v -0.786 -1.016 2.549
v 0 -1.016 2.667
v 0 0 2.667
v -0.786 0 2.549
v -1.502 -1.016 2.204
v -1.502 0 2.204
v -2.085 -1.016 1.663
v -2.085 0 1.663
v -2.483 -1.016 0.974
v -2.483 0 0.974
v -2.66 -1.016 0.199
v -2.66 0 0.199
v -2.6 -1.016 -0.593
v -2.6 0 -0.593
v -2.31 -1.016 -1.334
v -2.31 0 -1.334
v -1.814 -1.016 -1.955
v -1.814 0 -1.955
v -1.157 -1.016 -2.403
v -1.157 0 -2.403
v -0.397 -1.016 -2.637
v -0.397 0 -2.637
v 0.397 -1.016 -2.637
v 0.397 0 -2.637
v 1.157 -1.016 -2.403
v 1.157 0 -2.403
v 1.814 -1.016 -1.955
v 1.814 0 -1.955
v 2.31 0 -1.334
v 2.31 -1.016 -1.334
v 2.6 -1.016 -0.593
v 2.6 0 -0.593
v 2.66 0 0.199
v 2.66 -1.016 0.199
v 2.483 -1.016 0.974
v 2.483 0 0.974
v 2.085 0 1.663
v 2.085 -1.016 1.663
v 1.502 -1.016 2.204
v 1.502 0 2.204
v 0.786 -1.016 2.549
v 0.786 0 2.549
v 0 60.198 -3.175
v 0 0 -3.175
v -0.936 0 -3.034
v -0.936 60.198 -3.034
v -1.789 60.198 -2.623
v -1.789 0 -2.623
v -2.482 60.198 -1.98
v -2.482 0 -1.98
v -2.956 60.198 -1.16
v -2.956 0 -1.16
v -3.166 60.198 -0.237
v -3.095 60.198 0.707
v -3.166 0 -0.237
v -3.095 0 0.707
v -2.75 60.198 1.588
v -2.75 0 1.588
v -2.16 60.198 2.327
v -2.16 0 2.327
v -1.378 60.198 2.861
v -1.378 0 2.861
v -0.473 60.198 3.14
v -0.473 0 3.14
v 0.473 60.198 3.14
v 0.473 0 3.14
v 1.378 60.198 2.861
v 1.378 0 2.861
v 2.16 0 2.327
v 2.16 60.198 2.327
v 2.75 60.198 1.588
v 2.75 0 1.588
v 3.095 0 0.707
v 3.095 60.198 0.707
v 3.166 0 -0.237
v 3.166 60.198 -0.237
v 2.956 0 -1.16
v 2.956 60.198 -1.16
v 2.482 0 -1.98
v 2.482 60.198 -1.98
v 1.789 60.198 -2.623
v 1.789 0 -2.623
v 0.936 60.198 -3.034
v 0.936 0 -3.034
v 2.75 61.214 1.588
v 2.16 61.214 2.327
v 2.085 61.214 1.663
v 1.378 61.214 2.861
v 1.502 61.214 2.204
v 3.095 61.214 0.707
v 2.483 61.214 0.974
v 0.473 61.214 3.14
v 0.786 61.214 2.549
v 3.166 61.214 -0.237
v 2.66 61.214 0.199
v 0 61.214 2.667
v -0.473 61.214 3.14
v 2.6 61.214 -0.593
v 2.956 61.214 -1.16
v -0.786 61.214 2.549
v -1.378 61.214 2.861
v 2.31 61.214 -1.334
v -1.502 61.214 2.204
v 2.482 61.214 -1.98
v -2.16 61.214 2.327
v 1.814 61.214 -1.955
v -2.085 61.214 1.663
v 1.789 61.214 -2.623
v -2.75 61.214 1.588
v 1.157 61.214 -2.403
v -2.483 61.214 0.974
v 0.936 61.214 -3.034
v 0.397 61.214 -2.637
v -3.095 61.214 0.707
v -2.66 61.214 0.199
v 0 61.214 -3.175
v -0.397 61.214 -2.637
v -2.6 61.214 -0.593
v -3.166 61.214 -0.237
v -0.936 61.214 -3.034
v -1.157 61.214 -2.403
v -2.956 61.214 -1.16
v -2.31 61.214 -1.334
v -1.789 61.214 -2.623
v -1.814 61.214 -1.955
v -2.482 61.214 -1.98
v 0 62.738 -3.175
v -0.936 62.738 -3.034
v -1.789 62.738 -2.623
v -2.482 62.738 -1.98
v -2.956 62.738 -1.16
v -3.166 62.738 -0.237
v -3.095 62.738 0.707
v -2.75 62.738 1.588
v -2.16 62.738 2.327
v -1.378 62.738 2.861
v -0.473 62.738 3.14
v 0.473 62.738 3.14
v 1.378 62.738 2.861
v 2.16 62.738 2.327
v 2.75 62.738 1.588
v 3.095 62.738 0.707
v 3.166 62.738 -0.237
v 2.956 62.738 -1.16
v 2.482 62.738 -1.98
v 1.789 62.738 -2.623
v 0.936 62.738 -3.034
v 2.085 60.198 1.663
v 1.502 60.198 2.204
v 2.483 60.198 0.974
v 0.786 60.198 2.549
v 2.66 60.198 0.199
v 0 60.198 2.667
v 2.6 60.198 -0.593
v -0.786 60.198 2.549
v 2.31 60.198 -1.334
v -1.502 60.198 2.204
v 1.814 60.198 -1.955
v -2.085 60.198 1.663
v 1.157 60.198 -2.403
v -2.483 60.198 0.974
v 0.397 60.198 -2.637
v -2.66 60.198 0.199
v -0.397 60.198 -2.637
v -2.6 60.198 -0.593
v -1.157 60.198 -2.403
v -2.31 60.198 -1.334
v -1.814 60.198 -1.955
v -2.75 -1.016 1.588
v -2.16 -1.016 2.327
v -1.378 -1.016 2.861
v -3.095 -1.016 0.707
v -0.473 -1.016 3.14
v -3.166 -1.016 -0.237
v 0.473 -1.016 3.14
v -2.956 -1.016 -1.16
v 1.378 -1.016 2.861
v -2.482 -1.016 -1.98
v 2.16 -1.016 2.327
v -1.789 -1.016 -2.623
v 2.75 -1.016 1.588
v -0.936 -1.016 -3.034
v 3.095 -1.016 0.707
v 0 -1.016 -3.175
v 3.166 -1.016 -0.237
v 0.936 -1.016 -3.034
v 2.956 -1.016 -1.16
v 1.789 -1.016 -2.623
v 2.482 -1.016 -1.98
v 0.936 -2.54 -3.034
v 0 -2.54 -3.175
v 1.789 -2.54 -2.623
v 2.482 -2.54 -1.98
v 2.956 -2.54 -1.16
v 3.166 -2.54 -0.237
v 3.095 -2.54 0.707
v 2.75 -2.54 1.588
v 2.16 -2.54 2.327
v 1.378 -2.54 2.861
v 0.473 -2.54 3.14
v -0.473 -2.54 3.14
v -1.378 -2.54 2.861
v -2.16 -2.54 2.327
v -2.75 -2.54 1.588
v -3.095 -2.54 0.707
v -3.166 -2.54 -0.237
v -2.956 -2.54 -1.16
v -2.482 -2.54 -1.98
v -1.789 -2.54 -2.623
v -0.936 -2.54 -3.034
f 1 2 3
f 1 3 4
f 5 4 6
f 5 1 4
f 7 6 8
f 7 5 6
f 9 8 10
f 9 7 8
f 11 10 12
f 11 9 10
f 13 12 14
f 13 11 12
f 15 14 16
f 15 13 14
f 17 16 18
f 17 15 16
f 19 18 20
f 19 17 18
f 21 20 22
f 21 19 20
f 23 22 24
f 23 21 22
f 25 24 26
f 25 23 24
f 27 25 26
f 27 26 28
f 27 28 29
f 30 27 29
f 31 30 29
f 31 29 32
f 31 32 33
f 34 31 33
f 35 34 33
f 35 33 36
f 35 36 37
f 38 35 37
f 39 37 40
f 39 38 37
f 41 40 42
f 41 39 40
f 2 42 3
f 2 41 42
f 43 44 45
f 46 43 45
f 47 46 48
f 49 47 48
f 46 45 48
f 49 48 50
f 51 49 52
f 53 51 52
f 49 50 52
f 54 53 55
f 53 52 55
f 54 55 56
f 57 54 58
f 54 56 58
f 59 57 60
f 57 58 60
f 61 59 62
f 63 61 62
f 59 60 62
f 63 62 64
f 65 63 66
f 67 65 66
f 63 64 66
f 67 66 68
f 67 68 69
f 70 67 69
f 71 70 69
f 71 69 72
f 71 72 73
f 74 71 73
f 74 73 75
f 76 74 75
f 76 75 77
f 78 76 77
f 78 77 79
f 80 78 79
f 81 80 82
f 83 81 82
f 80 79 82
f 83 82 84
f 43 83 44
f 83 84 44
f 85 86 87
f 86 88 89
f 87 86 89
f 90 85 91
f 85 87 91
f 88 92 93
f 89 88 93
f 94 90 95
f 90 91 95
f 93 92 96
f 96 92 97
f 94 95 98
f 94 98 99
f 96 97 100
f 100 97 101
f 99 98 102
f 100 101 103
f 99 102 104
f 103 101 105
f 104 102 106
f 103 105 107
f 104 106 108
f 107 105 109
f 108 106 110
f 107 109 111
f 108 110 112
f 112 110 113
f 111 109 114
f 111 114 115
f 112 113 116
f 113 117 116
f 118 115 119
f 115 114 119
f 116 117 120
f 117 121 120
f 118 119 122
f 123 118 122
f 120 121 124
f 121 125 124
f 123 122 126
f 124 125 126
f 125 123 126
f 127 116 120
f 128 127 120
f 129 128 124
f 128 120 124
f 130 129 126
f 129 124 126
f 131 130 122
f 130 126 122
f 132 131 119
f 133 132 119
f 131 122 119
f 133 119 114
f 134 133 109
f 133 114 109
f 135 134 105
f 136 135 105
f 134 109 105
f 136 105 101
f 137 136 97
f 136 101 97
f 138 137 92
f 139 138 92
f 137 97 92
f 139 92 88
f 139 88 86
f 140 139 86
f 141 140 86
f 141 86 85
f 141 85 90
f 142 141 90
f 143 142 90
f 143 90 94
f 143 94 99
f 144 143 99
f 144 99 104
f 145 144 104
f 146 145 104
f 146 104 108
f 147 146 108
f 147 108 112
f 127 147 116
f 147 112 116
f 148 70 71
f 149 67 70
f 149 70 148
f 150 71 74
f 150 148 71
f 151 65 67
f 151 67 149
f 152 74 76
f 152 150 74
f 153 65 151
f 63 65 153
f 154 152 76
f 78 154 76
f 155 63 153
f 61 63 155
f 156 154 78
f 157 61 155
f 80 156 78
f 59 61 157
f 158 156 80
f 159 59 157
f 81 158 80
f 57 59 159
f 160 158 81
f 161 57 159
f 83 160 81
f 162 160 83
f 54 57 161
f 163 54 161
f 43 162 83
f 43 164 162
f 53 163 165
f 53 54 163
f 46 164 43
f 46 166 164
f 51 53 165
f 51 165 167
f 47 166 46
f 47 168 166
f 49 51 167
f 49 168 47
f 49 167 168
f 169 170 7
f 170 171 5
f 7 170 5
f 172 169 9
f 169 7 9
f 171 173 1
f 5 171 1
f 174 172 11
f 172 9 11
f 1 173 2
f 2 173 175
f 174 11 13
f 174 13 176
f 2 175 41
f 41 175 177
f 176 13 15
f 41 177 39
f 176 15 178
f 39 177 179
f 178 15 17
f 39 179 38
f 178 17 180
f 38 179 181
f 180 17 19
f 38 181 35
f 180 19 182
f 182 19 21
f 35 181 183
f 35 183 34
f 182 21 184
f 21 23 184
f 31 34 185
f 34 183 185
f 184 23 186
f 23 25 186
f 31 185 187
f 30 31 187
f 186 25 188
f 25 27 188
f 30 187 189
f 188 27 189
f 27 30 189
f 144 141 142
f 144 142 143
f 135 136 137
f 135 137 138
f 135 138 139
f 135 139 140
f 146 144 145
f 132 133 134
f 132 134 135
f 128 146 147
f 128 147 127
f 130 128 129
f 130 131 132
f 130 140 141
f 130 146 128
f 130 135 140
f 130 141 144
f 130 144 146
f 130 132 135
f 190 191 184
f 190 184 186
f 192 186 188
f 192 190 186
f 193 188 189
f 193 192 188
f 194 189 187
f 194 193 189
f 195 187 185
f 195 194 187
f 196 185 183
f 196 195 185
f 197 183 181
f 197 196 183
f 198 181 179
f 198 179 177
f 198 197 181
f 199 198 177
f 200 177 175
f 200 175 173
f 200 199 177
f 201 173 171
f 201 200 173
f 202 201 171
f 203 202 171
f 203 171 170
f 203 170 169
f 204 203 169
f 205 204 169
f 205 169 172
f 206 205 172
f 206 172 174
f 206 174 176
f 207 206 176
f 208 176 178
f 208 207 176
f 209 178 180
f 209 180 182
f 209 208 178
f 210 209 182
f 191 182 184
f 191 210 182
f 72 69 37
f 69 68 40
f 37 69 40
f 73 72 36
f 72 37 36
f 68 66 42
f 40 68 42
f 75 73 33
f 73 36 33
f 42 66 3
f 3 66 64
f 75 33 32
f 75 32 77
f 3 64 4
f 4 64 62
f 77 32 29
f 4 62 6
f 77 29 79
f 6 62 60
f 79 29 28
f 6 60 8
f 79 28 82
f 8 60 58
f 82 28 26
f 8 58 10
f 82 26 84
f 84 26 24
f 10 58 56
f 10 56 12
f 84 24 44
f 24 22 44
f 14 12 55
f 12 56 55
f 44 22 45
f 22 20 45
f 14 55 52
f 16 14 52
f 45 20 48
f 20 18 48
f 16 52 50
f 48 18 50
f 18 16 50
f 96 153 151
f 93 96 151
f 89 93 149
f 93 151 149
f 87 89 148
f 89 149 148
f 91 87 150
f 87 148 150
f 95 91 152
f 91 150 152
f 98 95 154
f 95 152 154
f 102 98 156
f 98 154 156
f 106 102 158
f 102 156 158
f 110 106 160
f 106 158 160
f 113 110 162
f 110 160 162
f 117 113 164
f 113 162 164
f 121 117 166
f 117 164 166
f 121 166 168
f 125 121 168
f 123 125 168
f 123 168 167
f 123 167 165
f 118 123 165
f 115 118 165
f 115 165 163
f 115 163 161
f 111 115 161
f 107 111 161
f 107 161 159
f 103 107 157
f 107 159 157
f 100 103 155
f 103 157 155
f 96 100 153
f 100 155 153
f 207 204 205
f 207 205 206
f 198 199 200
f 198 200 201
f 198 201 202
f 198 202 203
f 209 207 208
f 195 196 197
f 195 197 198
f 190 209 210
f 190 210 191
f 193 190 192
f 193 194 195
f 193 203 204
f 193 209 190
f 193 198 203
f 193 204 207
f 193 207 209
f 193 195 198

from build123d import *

# Parameters (mm, degrees)
SKETCH1_R           = 3.175
BOSS_EXTRUDE1_DEPTH = 60.198
SKETCH2_R           = 2.667
BOSS_EXTRUDE2_DEPTH = 1.016
SKETCH3_R           = 3.175
BOSS_EXTRUDE3_DEPTH = 1.524
BOSS_EXTRUDE4_START = 1.016
SKETCH4_R           = 2.667
BOSS_EXTRUDE4_DEPTH = 1.016
BOSS_EXTRUDE5_START = 1.524
SKETCH7_R           = 3.175
BOSS_EXTRUDE5_DEPTH = 1.524


with BuildPart() as part:
    # Sketch1 → Boss-Extrude1 (new body)
    with BuildSketch(Plane(origin=(0, 0, 0), x_dir=(1, 0, 0), z_dir=(0, 1, 0))):
        with Locations(Location((0, 0, 0), (0, 0, 90))):
            Circle(SKETCH1_R)
    extrude(amount=BOSS_EXTRUDE1_DEPTH)

    # Sketch2 → Boss-Extrude2 (add)
    with BuildSketch(Plane(origin=(0, 60.198, 0), x_dir=(1, 0, 0), z_dir=(0, 1, 0))):
        with Locations(Location((0, 0, 0), (0, 0, 270))):
            Circle(SKETCH2_R)
    extrude(amount=BOSS_EXTRUDE2_DEPTH)

    # Sketch3 → Boss-Extrude3 (add)
    with BuildSketch(Plane(origin=(0, 61.214, 0), x_dir=(1, 0, 0), z_dir=(0, 1, 0))):
        with Locations(Location((0, 0, 0), (0, 0, 90))):
            Circle(SKETCH3_R)
    extrude(amount=BOSS_EXTRUDE3_DEPTH)

    # Sketch4 → Boss-Extrude4 (add)
    with BuildSketch(Plane.XZ.offset(BOSS_EXTRUDE4_START)):
        with Locations(Location((0, 0, 0), (0, 0, 90))):
            Circle(SKETCH4_R)
    extrude(amount=-BOSS_EXTRUDE4_DEPTH)

    # Sketch7 → Boss-Extrude5 (add)
    with BuildSketch(Plane(origin=(0, -1.016, 0), x_dir=(-1, 0, 0), z_dir=(0, -1, 0)).offset(BOSS_EXTRUDE5_START)):
        with Locations(Location((0, 0, 0), (0, 0, 90))):
            Circle(SKETCH7_R)
    extrude(amount=-BOSS_EXTRUDE5_DEPTH)


solid = part.part
